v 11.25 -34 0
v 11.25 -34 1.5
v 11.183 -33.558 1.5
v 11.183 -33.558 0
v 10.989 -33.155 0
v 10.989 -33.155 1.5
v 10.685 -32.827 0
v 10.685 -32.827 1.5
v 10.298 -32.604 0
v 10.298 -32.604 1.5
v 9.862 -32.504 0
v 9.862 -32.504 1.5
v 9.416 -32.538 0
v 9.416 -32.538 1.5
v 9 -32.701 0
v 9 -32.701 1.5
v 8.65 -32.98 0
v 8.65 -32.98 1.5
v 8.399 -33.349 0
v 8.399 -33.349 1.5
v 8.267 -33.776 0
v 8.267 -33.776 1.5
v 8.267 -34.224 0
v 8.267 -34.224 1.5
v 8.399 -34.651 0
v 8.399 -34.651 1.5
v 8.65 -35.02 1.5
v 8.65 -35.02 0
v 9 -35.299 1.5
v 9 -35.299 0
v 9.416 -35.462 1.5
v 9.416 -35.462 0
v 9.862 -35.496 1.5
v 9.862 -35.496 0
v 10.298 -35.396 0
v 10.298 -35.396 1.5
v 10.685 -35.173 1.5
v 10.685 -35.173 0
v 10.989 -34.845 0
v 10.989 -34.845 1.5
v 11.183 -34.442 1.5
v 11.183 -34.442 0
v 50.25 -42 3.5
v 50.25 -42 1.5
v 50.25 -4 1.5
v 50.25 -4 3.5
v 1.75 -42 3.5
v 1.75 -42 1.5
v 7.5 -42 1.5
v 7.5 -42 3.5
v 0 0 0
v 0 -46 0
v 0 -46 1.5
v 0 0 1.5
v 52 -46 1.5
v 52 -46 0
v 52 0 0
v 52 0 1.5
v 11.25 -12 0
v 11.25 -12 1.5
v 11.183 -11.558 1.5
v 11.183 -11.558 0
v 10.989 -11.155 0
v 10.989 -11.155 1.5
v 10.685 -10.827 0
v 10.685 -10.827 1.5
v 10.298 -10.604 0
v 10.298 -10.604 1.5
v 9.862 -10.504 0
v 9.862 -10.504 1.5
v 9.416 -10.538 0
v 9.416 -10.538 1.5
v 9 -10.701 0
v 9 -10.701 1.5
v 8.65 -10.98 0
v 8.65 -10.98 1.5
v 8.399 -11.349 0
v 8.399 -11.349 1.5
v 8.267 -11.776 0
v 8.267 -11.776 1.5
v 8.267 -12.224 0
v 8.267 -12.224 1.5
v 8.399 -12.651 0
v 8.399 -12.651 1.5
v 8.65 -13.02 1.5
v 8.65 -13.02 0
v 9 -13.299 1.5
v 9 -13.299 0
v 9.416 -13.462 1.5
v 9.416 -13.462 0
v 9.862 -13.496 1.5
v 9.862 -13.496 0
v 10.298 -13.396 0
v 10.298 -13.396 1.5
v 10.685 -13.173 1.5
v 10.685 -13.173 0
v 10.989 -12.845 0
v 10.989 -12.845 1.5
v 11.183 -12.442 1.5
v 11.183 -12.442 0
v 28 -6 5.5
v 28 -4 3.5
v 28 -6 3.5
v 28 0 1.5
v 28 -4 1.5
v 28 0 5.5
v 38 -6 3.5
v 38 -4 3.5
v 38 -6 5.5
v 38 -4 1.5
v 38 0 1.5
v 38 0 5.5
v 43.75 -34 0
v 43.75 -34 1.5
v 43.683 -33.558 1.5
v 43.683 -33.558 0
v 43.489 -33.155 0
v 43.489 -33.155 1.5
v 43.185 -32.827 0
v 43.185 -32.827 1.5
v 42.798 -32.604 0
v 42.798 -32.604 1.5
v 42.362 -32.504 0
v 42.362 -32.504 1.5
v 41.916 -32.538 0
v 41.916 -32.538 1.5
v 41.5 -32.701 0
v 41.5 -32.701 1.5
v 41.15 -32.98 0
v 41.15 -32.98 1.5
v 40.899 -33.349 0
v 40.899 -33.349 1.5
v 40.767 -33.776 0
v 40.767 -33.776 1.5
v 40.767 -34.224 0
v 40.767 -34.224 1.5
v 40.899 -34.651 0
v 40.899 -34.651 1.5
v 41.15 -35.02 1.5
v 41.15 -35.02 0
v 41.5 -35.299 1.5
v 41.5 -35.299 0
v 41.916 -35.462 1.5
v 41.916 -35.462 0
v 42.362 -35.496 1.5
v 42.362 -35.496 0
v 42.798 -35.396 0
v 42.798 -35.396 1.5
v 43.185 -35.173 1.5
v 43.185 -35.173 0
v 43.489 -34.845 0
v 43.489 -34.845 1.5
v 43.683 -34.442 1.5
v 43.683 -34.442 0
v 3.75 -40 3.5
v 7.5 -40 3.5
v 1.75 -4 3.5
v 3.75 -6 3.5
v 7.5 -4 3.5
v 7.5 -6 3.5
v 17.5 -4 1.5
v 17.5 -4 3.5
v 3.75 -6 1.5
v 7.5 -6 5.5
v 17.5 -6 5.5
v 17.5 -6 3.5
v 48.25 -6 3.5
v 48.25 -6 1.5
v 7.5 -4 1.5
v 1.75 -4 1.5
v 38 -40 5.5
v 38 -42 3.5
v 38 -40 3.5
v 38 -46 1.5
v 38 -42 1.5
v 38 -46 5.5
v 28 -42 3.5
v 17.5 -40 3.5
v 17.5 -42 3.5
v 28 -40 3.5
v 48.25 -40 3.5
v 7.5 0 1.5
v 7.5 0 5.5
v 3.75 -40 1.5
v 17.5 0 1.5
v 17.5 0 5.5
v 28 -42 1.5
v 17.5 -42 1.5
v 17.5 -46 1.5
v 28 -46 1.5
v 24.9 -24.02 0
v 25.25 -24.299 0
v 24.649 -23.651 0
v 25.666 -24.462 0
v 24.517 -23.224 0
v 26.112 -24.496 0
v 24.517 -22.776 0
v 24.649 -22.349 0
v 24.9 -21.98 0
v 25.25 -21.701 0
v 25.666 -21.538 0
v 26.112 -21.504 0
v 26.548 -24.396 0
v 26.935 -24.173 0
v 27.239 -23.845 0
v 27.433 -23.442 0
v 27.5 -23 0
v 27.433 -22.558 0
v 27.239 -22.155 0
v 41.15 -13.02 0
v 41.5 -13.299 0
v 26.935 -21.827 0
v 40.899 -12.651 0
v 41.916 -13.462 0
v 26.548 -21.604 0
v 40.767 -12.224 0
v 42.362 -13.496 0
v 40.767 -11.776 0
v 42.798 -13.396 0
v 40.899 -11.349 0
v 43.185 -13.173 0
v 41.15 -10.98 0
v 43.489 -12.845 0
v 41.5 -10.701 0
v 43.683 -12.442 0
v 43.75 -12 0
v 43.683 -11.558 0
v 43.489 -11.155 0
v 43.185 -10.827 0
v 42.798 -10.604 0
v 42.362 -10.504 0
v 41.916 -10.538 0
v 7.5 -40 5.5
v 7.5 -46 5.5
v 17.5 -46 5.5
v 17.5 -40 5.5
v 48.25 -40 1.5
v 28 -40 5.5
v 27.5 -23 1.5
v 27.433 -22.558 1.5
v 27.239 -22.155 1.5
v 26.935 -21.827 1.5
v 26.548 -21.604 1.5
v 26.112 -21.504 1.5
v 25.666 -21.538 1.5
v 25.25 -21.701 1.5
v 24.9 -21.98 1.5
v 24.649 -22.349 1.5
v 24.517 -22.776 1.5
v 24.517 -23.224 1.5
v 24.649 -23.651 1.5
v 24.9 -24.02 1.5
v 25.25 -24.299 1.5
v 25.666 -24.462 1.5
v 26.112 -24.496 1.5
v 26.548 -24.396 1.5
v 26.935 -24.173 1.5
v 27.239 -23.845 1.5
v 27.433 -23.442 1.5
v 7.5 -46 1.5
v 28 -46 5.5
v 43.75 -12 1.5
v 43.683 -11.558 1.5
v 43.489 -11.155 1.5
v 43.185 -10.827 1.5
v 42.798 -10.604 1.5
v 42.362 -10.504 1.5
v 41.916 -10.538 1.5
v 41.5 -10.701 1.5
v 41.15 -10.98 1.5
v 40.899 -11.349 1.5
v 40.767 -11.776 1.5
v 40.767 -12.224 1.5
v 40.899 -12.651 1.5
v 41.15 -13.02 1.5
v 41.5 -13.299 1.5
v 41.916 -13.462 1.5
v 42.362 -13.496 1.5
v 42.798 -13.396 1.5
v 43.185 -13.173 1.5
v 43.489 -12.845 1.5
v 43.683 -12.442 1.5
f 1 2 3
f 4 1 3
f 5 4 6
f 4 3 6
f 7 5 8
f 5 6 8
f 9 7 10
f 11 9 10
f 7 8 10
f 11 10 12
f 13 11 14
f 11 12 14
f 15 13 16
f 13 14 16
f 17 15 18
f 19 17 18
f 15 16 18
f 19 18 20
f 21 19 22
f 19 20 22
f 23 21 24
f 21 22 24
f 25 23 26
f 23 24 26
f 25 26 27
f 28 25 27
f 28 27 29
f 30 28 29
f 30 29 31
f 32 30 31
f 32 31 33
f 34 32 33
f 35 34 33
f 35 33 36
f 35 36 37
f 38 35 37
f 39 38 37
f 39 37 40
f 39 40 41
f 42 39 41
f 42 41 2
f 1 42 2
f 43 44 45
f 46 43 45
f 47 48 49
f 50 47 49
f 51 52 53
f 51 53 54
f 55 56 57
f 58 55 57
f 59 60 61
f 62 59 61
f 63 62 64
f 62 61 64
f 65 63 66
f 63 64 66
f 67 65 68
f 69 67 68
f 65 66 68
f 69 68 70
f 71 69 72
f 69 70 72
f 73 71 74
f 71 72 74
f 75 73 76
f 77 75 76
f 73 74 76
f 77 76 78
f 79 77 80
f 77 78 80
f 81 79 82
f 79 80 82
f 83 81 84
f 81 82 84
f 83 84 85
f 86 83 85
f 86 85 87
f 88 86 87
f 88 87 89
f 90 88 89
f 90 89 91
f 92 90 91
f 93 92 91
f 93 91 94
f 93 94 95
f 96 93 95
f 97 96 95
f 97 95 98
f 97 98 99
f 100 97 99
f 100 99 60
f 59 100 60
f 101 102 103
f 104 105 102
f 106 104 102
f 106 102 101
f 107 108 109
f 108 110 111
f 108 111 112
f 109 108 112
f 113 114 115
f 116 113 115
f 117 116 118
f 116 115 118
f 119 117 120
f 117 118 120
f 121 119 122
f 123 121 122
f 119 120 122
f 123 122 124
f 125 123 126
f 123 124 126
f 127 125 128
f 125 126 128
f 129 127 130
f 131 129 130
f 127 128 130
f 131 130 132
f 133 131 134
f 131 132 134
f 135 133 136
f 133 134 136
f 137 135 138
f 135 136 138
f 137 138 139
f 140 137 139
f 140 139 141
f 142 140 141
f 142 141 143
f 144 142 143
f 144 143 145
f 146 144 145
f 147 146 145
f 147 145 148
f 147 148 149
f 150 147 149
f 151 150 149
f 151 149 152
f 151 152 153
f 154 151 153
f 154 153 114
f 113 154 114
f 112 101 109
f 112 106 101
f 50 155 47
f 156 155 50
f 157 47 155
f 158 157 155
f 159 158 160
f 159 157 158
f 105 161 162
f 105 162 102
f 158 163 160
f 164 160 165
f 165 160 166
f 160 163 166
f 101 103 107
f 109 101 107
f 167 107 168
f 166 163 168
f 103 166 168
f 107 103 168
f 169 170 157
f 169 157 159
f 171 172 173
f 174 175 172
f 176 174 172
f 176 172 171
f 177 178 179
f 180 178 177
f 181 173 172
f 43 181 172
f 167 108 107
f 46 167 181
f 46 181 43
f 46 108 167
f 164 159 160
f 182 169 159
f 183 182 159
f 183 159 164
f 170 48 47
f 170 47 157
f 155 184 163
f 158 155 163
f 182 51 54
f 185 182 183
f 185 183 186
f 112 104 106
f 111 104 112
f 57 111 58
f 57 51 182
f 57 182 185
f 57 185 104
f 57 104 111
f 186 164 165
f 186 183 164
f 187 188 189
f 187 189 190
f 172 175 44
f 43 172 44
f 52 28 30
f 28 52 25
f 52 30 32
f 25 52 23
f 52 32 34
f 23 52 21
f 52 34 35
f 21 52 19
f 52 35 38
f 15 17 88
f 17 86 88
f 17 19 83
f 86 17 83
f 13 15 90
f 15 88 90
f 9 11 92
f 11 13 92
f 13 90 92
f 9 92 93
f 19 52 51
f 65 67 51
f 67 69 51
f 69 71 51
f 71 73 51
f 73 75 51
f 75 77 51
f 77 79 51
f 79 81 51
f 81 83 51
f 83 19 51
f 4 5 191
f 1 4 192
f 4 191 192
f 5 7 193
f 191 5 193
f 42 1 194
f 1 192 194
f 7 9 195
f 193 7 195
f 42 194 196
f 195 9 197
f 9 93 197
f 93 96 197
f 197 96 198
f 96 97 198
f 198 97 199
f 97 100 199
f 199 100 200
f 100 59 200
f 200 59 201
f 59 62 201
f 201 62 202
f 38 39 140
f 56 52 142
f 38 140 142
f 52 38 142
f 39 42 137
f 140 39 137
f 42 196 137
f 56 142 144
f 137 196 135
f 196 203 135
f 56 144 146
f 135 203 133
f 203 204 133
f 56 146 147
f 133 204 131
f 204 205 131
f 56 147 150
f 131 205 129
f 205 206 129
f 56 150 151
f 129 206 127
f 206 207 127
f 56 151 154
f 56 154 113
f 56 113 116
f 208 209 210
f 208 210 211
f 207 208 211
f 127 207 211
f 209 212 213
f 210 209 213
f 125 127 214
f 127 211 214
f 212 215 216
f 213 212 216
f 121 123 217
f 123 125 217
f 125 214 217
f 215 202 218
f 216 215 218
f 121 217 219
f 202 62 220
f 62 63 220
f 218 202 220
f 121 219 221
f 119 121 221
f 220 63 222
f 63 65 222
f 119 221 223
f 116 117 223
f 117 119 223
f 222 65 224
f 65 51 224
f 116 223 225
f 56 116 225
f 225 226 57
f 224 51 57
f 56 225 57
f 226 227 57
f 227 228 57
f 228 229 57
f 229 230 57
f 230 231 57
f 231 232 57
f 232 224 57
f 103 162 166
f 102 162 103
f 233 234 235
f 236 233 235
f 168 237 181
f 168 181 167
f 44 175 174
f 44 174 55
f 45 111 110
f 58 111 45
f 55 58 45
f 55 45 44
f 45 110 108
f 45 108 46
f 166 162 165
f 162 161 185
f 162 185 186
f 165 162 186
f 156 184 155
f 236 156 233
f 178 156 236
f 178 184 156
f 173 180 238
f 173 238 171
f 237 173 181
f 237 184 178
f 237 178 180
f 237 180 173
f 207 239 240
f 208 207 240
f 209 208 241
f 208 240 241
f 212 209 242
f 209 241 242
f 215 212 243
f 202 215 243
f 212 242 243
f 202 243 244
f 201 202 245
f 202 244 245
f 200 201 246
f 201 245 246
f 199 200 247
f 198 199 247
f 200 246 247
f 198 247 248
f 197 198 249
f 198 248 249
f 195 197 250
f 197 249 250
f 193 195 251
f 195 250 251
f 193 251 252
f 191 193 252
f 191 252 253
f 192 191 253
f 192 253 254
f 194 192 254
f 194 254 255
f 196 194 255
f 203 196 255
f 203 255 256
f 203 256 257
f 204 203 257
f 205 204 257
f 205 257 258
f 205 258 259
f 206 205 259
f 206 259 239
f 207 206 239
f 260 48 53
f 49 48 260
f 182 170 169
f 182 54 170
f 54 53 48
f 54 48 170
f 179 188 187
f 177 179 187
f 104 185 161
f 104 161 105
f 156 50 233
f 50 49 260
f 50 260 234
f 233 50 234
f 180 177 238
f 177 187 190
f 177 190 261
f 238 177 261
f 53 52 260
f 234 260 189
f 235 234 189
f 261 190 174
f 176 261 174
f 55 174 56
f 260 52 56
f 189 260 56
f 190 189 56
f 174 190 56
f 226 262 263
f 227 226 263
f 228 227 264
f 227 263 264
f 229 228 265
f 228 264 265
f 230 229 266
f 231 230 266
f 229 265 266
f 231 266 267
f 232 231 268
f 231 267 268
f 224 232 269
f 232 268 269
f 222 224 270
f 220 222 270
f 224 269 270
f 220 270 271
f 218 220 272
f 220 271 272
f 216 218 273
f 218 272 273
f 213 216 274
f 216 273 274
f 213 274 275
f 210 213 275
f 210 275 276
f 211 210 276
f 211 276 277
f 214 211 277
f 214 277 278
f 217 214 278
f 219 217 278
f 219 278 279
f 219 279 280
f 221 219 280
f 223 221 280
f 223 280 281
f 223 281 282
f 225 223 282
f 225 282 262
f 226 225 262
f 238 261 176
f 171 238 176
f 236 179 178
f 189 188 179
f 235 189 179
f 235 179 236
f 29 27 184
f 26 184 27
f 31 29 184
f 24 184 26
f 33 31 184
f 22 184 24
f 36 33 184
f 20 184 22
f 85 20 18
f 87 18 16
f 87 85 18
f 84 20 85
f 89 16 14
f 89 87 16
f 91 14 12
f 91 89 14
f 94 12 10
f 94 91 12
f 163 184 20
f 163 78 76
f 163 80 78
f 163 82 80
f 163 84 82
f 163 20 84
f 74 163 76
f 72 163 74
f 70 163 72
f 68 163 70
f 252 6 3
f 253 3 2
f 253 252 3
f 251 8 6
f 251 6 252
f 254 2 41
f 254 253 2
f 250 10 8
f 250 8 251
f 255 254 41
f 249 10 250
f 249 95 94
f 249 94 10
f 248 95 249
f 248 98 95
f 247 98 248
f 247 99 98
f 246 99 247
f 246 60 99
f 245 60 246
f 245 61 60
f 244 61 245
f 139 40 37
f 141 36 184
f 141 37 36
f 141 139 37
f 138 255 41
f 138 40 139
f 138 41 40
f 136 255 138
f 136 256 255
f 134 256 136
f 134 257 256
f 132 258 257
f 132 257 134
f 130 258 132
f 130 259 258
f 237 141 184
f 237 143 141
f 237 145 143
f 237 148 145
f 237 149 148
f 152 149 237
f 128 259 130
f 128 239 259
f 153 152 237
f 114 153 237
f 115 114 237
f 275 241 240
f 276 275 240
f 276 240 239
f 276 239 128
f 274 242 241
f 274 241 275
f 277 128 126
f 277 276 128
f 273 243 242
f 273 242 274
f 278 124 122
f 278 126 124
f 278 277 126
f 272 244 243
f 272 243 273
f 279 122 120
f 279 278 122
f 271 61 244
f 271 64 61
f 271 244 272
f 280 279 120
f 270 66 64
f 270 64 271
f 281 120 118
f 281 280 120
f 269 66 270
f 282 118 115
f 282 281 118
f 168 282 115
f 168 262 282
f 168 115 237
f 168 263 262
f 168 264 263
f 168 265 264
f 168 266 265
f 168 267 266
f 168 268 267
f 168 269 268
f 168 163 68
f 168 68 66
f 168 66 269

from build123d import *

# Parameters (mm, degrees)
F0_W      = 52
F0_H      = 46
F1_DEPTH  = 1.5
F2_W      = 48.5
F2_H      = 38
F2_W_2    = 44.5
F2_H_2    = 34
F3_DEPTH  = 2
F4_W      = 10
F4_H      = 4
F5_DEPTH  = 4
F6_R      = 1.5
F7_DEPTH  = 25
F8_DEPTH  = 2
F9_DEPTH  = 2
F10_DEPTH = 2
F11_DEPTH = 2


with BuildPart() as f1:
    # F0 (on Top) → F1 (new body)
    with BuildSketch(Plane.XY):
        with Locations((26, -23)):
            Rectangle(F0_W, F0_H)
    extrude(amount=F1_DEPTH)

    # F2 (on face) → F3 (join)
    with BuildSketch(Plane.XY.offset(1.5)):
        with Locations((26, -23)):
            Rectangle(F2_W, F2_H)
        with Locations((26, -23)):
            Rectangle(F2_W_2, F2_H_2, mode=Mode.SUBTRACT)
    extrude(amount=F3_DEPTH)

    # F4 (on face) → F5 (join)
    with BuildSketch(Plane.XY.offset(1.5)):
        with Locations((12.5, -44)):
            Rectangle(F4_W, F4_H)
        with Locations((33, -44)):
            Rectangle(F4_W, F4_H)
        with Locations((33, -2)):
            Rectangle(F4_W, F4_H)
        with Locations((12.5, -2)):
            Rectangle(F4_W, F4_H)
    extrude(amount=F5_DEPTH)

    # F6 (on face) → F7 (cut)
    with BuildSketch(Plane.XY.offset(1.5)):
        with Locations((9.75, -12)):
            Circle(F6_R)
        with Locations((42.25, -12)):
            Circle(F6_R)
        with Locations((26, -23)):
            Circle(F6_R)
        with Locations((9.75, -34)):
            Circle(F6_R)
        with Locations((42.25, -34)):
            Circle(F6_R)
    extrude(amount=-F7_DEPTH, mode=Mode.SUBTRACT)

    # F8 (add, through all): a face of the model
    f8_faces = [f1.faces().sort_by_distance(p)[0] for p in [
        (12.5, -4, 4.5),
    ]]
    extrude(f8_faces, amount=F8_DEPTH)

    # F9 (add, through all): a face of the model
    f9_faces = [f1.faces().sort_by_distance(p)[0] for p in [
        (33, -4, 4.5),
    ]]
    extrude(f9_faces, amount=F9_DEPTH)

    # F10 (add, through all): a face of the model
    f10_faces = [f1.faces().sort_by_distance(p)[0] for p in [
        (33, -42, 4.5),
    ]]
    extrude(f10_faces, amount=F10_DEPTH)

    # F11 (add, through all): a face of the model
    f11_faces = [f1.faces().sort_by_distance(p)[0] for p in [
        (12.5, -42, 4.5),
    ]]
    extrude(f11_faces, amount=F11_DEPTH)


solid = f1.part
